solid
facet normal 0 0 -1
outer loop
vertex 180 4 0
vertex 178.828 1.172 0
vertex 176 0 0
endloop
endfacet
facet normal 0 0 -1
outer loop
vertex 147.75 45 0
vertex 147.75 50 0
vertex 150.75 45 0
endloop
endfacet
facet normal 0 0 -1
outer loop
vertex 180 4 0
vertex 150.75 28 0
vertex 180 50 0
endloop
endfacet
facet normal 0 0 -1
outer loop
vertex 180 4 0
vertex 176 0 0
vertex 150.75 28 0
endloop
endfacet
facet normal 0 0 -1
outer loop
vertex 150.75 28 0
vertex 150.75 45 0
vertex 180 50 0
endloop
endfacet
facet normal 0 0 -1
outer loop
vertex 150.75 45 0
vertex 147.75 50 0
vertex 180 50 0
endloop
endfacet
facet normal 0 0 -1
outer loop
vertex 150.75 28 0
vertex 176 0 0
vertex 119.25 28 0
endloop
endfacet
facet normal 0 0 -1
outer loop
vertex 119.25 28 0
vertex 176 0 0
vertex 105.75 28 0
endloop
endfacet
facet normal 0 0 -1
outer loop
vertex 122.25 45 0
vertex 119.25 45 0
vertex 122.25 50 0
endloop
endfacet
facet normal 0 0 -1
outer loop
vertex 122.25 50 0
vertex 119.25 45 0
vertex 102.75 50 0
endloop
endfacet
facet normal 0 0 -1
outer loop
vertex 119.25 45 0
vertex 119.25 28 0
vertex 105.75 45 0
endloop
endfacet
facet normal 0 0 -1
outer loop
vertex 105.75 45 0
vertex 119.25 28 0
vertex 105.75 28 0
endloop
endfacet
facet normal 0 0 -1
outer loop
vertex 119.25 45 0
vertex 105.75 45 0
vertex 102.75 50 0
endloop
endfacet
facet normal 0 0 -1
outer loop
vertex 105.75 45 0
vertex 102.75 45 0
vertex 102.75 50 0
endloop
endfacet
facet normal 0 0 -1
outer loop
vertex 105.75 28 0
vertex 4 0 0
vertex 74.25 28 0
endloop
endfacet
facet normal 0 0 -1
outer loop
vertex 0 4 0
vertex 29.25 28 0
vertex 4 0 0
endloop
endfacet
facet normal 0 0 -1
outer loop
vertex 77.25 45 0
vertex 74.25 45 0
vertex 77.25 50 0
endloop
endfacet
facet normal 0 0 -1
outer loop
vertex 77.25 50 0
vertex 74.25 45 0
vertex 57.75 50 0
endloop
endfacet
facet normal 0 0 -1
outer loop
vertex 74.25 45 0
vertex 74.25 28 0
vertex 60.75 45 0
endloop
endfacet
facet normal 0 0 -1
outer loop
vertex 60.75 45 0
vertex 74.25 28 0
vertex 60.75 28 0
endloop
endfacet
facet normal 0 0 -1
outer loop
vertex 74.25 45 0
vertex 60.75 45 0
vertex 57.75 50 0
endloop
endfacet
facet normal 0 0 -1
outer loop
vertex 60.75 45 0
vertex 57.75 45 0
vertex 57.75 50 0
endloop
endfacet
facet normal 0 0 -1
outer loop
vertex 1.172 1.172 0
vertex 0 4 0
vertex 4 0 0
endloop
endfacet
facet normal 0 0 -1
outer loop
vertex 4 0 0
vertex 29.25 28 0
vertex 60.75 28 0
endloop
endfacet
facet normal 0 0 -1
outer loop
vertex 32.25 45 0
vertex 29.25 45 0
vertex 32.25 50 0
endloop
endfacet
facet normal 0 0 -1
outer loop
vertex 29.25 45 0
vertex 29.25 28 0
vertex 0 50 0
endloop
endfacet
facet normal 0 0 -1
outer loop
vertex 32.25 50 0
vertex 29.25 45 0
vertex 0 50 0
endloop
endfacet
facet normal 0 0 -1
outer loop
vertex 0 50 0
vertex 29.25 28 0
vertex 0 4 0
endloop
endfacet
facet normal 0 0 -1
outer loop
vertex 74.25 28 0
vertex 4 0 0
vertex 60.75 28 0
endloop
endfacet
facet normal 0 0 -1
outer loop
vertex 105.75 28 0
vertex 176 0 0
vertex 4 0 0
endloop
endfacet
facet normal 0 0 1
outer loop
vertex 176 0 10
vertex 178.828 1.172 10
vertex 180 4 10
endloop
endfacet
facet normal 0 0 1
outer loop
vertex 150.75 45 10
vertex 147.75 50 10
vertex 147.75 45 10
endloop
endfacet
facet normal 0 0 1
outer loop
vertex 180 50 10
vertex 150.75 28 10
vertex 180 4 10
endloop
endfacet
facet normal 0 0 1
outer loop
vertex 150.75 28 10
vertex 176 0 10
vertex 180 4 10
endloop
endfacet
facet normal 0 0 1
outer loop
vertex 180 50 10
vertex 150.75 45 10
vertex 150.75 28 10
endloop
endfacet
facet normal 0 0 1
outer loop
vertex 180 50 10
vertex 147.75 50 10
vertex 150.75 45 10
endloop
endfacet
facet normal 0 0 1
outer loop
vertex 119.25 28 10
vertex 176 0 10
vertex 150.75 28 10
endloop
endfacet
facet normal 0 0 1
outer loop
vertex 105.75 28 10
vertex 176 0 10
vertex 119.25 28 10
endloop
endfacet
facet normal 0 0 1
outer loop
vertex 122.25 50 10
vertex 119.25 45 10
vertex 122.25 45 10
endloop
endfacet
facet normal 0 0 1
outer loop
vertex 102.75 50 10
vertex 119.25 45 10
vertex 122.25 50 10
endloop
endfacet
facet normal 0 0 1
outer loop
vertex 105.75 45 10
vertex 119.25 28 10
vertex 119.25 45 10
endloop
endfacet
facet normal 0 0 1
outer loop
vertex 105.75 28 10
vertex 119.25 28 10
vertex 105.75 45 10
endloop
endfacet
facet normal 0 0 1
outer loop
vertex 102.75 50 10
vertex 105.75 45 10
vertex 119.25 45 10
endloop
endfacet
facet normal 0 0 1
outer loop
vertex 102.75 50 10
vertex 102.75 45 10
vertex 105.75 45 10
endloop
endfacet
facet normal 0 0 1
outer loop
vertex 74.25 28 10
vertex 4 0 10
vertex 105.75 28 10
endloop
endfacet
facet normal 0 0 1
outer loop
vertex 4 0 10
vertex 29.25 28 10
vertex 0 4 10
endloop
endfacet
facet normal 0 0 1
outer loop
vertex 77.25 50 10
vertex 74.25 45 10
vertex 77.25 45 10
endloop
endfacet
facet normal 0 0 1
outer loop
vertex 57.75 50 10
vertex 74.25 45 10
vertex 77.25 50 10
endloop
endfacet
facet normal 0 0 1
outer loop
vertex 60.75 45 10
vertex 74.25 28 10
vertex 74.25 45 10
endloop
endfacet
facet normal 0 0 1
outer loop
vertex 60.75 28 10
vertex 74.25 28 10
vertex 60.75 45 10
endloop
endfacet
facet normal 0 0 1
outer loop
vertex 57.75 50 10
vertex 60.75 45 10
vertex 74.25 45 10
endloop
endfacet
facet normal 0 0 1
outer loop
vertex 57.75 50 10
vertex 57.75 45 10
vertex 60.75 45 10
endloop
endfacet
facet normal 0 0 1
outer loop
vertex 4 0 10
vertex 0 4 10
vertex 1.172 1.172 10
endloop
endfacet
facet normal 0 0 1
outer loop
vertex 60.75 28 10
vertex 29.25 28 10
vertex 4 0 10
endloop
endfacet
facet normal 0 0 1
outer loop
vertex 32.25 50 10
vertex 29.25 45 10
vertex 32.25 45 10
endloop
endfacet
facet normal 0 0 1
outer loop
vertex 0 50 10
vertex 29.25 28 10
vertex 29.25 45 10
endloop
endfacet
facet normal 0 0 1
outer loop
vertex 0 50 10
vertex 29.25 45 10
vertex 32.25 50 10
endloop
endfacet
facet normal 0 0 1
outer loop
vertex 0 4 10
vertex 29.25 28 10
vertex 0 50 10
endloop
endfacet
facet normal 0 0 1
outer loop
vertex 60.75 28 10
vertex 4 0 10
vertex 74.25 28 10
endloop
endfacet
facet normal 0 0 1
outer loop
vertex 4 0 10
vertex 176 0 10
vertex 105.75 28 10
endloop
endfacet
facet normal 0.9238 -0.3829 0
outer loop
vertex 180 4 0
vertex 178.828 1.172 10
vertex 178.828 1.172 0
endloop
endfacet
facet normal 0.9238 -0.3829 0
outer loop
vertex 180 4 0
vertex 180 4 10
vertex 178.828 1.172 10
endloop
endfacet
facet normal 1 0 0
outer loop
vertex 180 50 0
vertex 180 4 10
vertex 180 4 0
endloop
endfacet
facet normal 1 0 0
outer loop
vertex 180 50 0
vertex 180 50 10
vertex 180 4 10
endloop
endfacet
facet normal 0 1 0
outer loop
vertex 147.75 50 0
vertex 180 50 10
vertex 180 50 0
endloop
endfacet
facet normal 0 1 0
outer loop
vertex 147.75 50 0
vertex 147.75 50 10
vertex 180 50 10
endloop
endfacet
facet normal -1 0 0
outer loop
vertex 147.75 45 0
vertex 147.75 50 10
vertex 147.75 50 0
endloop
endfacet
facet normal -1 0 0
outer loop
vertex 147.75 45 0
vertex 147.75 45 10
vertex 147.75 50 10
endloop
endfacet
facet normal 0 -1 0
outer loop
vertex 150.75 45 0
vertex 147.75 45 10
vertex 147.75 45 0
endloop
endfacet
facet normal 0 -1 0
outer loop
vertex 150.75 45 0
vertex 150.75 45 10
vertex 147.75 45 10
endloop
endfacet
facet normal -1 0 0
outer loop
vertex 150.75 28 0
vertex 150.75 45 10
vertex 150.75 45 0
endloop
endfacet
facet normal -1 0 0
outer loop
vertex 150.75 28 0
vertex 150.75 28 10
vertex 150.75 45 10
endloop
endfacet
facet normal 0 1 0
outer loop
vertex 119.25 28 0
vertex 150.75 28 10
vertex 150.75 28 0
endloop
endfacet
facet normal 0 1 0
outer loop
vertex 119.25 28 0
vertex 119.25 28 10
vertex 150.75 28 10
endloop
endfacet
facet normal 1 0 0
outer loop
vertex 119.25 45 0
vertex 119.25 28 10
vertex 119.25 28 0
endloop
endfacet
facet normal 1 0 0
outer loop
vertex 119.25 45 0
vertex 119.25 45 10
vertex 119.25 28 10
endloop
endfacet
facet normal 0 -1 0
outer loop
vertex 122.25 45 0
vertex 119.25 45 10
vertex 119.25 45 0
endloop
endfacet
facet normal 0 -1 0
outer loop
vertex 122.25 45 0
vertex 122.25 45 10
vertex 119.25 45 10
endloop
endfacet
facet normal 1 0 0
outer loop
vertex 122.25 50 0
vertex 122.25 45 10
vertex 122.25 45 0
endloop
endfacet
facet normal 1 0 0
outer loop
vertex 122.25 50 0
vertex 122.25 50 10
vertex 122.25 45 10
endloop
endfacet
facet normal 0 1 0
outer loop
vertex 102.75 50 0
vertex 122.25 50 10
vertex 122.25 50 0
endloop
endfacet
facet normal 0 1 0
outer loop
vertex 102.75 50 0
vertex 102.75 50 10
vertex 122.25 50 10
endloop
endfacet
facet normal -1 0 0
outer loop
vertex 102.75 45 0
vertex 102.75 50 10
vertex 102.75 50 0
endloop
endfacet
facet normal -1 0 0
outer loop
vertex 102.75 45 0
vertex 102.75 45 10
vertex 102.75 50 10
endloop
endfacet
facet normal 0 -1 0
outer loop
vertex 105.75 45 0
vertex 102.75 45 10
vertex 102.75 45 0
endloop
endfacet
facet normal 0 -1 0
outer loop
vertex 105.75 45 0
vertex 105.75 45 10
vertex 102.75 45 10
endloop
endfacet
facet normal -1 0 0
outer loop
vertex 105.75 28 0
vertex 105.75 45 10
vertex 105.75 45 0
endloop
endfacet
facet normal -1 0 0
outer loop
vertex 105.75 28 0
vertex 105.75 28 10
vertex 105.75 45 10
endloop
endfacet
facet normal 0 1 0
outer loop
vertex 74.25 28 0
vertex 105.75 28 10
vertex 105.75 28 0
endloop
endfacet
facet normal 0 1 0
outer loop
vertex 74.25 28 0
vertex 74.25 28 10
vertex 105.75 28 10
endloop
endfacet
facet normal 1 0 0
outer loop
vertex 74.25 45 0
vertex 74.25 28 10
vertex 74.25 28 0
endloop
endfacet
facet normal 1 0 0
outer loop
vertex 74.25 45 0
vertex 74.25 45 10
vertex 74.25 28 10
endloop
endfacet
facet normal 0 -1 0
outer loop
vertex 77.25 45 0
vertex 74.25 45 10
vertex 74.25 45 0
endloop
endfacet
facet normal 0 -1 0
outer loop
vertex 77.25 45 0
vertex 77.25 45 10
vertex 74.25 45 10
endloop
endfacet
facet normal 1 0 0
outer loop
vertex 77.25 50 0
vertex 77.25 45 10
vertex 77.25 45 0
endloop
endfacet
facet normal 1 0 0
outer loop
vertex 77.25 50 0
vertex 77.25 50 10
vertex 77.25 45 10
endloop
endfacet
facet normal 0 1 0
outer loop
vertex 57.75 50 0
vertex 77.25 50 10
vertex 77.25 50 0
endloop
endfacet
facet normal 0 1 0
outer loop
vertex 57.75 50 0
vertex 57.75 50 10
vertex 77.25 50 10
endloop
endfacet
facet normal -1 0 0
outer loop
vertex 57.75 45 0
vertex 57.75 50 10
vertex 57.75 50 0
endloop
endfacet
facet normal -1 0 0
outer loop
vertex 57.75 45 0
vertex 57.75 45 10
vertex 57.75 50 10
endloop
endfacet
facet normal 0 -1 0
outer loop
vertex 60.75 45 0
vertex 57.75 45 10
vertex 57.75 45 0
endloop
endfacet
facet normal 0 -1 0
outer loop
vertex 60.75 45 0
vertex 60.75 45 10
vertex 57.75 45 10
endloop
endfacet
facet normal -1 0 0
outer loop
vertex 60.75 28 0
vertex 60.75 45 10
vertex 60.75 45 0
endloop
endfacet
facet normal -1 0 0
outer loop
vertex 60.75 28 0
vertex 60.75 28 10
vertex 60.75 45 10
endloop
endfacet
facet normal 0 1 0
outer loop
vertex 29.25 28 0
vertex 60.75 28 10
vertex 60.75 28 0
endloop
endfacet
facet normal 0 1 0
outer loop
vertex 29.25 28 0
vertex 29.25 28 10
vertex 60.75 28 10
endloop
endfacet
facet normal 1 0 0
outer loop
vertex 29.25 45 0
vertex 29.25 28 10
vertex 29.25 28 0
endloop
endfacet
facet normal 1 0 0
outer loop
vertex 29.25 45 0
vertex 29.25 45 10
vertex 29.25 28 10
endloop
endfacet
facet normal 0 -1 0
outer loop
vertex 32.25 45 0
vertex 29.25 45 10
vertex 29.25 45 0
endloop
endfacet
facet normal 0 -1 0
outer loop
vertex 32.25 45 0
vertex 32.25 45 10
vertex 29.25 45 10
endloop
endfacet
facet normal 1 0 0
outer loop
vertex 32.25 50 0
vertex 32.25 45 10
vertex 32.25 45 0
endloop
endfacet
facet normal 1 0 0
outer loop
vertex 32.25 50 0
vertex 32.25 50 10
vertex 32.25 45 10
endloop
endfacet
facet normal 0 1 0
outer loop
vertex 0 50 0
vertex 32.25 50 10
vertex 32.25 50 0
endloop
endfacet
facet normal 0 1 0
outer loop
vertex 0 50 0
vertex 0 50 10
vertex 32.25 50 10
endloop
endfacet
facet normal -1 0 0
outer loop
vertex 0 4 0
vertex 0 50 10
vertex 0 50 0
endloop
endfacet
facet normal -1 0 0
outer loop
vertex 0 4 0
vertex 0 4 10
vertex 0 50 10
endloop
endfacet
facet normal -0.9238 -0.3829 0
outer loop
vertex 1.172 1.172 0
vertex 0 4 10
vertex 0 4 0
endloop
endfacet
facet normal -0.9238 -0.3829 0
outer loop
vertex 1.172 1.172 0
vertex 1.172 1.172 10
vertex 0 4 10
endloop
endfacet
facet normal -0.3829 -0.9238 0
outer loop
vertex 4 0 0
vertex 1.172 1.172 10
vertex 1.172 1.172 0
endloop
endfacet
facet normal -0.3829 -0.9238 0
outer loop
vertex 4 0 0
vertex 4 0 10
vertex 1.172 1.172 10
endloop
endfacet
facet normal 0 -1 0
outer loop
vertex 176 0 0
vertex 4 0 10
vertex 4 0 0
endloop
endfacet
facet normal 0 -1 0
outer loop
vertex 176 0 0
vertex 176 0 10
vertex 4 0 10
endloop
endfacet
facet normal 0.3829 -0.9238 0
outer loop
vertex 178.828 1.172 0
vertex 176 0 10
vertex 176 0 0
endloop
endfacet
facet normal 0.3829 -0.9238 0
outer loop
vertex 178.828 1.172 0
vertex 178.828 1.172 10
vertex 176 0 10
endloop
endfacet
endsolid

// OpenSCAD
$fn = 32;

// ----------------------------------------------------------------------
// Oversize slot bar: 180 mm bar with 3 oversize windows
// ----------------------------------------------------------------------

// --- parameters (mm) ---
profile_height = 10;      // extrusion height
profile_points = 32;      // points of the closed outline

profile = [[0, 4], [1.172, 1.172], [4, 0], [176, 0], [178.828, 1.172], [180, 4], [180, 50], [147.75, 50], [147.75, 45], [150.75, 45], [150.75, 28], [119.25, 28], [119.25, 45], [122.25, 45], [122.25, 50], [102.75, 50], [102.75, 45], [105.75, 45], [105.75, 28], [74.25, 28], [74.25, 45], [77.25, 45], [77.25, 50], [57.75, 50], [57.75, 45], [60.75, 45], [60.75, 28], [29.25, 28], [29.25, 45], [32.25, 45], [32.25, 50], [0, 50]];  // single closed polygon, 32 points, counter clockwise

// --- the one profile operation ---
linear_extrude(height = profile_height) polygon(points = profile);
